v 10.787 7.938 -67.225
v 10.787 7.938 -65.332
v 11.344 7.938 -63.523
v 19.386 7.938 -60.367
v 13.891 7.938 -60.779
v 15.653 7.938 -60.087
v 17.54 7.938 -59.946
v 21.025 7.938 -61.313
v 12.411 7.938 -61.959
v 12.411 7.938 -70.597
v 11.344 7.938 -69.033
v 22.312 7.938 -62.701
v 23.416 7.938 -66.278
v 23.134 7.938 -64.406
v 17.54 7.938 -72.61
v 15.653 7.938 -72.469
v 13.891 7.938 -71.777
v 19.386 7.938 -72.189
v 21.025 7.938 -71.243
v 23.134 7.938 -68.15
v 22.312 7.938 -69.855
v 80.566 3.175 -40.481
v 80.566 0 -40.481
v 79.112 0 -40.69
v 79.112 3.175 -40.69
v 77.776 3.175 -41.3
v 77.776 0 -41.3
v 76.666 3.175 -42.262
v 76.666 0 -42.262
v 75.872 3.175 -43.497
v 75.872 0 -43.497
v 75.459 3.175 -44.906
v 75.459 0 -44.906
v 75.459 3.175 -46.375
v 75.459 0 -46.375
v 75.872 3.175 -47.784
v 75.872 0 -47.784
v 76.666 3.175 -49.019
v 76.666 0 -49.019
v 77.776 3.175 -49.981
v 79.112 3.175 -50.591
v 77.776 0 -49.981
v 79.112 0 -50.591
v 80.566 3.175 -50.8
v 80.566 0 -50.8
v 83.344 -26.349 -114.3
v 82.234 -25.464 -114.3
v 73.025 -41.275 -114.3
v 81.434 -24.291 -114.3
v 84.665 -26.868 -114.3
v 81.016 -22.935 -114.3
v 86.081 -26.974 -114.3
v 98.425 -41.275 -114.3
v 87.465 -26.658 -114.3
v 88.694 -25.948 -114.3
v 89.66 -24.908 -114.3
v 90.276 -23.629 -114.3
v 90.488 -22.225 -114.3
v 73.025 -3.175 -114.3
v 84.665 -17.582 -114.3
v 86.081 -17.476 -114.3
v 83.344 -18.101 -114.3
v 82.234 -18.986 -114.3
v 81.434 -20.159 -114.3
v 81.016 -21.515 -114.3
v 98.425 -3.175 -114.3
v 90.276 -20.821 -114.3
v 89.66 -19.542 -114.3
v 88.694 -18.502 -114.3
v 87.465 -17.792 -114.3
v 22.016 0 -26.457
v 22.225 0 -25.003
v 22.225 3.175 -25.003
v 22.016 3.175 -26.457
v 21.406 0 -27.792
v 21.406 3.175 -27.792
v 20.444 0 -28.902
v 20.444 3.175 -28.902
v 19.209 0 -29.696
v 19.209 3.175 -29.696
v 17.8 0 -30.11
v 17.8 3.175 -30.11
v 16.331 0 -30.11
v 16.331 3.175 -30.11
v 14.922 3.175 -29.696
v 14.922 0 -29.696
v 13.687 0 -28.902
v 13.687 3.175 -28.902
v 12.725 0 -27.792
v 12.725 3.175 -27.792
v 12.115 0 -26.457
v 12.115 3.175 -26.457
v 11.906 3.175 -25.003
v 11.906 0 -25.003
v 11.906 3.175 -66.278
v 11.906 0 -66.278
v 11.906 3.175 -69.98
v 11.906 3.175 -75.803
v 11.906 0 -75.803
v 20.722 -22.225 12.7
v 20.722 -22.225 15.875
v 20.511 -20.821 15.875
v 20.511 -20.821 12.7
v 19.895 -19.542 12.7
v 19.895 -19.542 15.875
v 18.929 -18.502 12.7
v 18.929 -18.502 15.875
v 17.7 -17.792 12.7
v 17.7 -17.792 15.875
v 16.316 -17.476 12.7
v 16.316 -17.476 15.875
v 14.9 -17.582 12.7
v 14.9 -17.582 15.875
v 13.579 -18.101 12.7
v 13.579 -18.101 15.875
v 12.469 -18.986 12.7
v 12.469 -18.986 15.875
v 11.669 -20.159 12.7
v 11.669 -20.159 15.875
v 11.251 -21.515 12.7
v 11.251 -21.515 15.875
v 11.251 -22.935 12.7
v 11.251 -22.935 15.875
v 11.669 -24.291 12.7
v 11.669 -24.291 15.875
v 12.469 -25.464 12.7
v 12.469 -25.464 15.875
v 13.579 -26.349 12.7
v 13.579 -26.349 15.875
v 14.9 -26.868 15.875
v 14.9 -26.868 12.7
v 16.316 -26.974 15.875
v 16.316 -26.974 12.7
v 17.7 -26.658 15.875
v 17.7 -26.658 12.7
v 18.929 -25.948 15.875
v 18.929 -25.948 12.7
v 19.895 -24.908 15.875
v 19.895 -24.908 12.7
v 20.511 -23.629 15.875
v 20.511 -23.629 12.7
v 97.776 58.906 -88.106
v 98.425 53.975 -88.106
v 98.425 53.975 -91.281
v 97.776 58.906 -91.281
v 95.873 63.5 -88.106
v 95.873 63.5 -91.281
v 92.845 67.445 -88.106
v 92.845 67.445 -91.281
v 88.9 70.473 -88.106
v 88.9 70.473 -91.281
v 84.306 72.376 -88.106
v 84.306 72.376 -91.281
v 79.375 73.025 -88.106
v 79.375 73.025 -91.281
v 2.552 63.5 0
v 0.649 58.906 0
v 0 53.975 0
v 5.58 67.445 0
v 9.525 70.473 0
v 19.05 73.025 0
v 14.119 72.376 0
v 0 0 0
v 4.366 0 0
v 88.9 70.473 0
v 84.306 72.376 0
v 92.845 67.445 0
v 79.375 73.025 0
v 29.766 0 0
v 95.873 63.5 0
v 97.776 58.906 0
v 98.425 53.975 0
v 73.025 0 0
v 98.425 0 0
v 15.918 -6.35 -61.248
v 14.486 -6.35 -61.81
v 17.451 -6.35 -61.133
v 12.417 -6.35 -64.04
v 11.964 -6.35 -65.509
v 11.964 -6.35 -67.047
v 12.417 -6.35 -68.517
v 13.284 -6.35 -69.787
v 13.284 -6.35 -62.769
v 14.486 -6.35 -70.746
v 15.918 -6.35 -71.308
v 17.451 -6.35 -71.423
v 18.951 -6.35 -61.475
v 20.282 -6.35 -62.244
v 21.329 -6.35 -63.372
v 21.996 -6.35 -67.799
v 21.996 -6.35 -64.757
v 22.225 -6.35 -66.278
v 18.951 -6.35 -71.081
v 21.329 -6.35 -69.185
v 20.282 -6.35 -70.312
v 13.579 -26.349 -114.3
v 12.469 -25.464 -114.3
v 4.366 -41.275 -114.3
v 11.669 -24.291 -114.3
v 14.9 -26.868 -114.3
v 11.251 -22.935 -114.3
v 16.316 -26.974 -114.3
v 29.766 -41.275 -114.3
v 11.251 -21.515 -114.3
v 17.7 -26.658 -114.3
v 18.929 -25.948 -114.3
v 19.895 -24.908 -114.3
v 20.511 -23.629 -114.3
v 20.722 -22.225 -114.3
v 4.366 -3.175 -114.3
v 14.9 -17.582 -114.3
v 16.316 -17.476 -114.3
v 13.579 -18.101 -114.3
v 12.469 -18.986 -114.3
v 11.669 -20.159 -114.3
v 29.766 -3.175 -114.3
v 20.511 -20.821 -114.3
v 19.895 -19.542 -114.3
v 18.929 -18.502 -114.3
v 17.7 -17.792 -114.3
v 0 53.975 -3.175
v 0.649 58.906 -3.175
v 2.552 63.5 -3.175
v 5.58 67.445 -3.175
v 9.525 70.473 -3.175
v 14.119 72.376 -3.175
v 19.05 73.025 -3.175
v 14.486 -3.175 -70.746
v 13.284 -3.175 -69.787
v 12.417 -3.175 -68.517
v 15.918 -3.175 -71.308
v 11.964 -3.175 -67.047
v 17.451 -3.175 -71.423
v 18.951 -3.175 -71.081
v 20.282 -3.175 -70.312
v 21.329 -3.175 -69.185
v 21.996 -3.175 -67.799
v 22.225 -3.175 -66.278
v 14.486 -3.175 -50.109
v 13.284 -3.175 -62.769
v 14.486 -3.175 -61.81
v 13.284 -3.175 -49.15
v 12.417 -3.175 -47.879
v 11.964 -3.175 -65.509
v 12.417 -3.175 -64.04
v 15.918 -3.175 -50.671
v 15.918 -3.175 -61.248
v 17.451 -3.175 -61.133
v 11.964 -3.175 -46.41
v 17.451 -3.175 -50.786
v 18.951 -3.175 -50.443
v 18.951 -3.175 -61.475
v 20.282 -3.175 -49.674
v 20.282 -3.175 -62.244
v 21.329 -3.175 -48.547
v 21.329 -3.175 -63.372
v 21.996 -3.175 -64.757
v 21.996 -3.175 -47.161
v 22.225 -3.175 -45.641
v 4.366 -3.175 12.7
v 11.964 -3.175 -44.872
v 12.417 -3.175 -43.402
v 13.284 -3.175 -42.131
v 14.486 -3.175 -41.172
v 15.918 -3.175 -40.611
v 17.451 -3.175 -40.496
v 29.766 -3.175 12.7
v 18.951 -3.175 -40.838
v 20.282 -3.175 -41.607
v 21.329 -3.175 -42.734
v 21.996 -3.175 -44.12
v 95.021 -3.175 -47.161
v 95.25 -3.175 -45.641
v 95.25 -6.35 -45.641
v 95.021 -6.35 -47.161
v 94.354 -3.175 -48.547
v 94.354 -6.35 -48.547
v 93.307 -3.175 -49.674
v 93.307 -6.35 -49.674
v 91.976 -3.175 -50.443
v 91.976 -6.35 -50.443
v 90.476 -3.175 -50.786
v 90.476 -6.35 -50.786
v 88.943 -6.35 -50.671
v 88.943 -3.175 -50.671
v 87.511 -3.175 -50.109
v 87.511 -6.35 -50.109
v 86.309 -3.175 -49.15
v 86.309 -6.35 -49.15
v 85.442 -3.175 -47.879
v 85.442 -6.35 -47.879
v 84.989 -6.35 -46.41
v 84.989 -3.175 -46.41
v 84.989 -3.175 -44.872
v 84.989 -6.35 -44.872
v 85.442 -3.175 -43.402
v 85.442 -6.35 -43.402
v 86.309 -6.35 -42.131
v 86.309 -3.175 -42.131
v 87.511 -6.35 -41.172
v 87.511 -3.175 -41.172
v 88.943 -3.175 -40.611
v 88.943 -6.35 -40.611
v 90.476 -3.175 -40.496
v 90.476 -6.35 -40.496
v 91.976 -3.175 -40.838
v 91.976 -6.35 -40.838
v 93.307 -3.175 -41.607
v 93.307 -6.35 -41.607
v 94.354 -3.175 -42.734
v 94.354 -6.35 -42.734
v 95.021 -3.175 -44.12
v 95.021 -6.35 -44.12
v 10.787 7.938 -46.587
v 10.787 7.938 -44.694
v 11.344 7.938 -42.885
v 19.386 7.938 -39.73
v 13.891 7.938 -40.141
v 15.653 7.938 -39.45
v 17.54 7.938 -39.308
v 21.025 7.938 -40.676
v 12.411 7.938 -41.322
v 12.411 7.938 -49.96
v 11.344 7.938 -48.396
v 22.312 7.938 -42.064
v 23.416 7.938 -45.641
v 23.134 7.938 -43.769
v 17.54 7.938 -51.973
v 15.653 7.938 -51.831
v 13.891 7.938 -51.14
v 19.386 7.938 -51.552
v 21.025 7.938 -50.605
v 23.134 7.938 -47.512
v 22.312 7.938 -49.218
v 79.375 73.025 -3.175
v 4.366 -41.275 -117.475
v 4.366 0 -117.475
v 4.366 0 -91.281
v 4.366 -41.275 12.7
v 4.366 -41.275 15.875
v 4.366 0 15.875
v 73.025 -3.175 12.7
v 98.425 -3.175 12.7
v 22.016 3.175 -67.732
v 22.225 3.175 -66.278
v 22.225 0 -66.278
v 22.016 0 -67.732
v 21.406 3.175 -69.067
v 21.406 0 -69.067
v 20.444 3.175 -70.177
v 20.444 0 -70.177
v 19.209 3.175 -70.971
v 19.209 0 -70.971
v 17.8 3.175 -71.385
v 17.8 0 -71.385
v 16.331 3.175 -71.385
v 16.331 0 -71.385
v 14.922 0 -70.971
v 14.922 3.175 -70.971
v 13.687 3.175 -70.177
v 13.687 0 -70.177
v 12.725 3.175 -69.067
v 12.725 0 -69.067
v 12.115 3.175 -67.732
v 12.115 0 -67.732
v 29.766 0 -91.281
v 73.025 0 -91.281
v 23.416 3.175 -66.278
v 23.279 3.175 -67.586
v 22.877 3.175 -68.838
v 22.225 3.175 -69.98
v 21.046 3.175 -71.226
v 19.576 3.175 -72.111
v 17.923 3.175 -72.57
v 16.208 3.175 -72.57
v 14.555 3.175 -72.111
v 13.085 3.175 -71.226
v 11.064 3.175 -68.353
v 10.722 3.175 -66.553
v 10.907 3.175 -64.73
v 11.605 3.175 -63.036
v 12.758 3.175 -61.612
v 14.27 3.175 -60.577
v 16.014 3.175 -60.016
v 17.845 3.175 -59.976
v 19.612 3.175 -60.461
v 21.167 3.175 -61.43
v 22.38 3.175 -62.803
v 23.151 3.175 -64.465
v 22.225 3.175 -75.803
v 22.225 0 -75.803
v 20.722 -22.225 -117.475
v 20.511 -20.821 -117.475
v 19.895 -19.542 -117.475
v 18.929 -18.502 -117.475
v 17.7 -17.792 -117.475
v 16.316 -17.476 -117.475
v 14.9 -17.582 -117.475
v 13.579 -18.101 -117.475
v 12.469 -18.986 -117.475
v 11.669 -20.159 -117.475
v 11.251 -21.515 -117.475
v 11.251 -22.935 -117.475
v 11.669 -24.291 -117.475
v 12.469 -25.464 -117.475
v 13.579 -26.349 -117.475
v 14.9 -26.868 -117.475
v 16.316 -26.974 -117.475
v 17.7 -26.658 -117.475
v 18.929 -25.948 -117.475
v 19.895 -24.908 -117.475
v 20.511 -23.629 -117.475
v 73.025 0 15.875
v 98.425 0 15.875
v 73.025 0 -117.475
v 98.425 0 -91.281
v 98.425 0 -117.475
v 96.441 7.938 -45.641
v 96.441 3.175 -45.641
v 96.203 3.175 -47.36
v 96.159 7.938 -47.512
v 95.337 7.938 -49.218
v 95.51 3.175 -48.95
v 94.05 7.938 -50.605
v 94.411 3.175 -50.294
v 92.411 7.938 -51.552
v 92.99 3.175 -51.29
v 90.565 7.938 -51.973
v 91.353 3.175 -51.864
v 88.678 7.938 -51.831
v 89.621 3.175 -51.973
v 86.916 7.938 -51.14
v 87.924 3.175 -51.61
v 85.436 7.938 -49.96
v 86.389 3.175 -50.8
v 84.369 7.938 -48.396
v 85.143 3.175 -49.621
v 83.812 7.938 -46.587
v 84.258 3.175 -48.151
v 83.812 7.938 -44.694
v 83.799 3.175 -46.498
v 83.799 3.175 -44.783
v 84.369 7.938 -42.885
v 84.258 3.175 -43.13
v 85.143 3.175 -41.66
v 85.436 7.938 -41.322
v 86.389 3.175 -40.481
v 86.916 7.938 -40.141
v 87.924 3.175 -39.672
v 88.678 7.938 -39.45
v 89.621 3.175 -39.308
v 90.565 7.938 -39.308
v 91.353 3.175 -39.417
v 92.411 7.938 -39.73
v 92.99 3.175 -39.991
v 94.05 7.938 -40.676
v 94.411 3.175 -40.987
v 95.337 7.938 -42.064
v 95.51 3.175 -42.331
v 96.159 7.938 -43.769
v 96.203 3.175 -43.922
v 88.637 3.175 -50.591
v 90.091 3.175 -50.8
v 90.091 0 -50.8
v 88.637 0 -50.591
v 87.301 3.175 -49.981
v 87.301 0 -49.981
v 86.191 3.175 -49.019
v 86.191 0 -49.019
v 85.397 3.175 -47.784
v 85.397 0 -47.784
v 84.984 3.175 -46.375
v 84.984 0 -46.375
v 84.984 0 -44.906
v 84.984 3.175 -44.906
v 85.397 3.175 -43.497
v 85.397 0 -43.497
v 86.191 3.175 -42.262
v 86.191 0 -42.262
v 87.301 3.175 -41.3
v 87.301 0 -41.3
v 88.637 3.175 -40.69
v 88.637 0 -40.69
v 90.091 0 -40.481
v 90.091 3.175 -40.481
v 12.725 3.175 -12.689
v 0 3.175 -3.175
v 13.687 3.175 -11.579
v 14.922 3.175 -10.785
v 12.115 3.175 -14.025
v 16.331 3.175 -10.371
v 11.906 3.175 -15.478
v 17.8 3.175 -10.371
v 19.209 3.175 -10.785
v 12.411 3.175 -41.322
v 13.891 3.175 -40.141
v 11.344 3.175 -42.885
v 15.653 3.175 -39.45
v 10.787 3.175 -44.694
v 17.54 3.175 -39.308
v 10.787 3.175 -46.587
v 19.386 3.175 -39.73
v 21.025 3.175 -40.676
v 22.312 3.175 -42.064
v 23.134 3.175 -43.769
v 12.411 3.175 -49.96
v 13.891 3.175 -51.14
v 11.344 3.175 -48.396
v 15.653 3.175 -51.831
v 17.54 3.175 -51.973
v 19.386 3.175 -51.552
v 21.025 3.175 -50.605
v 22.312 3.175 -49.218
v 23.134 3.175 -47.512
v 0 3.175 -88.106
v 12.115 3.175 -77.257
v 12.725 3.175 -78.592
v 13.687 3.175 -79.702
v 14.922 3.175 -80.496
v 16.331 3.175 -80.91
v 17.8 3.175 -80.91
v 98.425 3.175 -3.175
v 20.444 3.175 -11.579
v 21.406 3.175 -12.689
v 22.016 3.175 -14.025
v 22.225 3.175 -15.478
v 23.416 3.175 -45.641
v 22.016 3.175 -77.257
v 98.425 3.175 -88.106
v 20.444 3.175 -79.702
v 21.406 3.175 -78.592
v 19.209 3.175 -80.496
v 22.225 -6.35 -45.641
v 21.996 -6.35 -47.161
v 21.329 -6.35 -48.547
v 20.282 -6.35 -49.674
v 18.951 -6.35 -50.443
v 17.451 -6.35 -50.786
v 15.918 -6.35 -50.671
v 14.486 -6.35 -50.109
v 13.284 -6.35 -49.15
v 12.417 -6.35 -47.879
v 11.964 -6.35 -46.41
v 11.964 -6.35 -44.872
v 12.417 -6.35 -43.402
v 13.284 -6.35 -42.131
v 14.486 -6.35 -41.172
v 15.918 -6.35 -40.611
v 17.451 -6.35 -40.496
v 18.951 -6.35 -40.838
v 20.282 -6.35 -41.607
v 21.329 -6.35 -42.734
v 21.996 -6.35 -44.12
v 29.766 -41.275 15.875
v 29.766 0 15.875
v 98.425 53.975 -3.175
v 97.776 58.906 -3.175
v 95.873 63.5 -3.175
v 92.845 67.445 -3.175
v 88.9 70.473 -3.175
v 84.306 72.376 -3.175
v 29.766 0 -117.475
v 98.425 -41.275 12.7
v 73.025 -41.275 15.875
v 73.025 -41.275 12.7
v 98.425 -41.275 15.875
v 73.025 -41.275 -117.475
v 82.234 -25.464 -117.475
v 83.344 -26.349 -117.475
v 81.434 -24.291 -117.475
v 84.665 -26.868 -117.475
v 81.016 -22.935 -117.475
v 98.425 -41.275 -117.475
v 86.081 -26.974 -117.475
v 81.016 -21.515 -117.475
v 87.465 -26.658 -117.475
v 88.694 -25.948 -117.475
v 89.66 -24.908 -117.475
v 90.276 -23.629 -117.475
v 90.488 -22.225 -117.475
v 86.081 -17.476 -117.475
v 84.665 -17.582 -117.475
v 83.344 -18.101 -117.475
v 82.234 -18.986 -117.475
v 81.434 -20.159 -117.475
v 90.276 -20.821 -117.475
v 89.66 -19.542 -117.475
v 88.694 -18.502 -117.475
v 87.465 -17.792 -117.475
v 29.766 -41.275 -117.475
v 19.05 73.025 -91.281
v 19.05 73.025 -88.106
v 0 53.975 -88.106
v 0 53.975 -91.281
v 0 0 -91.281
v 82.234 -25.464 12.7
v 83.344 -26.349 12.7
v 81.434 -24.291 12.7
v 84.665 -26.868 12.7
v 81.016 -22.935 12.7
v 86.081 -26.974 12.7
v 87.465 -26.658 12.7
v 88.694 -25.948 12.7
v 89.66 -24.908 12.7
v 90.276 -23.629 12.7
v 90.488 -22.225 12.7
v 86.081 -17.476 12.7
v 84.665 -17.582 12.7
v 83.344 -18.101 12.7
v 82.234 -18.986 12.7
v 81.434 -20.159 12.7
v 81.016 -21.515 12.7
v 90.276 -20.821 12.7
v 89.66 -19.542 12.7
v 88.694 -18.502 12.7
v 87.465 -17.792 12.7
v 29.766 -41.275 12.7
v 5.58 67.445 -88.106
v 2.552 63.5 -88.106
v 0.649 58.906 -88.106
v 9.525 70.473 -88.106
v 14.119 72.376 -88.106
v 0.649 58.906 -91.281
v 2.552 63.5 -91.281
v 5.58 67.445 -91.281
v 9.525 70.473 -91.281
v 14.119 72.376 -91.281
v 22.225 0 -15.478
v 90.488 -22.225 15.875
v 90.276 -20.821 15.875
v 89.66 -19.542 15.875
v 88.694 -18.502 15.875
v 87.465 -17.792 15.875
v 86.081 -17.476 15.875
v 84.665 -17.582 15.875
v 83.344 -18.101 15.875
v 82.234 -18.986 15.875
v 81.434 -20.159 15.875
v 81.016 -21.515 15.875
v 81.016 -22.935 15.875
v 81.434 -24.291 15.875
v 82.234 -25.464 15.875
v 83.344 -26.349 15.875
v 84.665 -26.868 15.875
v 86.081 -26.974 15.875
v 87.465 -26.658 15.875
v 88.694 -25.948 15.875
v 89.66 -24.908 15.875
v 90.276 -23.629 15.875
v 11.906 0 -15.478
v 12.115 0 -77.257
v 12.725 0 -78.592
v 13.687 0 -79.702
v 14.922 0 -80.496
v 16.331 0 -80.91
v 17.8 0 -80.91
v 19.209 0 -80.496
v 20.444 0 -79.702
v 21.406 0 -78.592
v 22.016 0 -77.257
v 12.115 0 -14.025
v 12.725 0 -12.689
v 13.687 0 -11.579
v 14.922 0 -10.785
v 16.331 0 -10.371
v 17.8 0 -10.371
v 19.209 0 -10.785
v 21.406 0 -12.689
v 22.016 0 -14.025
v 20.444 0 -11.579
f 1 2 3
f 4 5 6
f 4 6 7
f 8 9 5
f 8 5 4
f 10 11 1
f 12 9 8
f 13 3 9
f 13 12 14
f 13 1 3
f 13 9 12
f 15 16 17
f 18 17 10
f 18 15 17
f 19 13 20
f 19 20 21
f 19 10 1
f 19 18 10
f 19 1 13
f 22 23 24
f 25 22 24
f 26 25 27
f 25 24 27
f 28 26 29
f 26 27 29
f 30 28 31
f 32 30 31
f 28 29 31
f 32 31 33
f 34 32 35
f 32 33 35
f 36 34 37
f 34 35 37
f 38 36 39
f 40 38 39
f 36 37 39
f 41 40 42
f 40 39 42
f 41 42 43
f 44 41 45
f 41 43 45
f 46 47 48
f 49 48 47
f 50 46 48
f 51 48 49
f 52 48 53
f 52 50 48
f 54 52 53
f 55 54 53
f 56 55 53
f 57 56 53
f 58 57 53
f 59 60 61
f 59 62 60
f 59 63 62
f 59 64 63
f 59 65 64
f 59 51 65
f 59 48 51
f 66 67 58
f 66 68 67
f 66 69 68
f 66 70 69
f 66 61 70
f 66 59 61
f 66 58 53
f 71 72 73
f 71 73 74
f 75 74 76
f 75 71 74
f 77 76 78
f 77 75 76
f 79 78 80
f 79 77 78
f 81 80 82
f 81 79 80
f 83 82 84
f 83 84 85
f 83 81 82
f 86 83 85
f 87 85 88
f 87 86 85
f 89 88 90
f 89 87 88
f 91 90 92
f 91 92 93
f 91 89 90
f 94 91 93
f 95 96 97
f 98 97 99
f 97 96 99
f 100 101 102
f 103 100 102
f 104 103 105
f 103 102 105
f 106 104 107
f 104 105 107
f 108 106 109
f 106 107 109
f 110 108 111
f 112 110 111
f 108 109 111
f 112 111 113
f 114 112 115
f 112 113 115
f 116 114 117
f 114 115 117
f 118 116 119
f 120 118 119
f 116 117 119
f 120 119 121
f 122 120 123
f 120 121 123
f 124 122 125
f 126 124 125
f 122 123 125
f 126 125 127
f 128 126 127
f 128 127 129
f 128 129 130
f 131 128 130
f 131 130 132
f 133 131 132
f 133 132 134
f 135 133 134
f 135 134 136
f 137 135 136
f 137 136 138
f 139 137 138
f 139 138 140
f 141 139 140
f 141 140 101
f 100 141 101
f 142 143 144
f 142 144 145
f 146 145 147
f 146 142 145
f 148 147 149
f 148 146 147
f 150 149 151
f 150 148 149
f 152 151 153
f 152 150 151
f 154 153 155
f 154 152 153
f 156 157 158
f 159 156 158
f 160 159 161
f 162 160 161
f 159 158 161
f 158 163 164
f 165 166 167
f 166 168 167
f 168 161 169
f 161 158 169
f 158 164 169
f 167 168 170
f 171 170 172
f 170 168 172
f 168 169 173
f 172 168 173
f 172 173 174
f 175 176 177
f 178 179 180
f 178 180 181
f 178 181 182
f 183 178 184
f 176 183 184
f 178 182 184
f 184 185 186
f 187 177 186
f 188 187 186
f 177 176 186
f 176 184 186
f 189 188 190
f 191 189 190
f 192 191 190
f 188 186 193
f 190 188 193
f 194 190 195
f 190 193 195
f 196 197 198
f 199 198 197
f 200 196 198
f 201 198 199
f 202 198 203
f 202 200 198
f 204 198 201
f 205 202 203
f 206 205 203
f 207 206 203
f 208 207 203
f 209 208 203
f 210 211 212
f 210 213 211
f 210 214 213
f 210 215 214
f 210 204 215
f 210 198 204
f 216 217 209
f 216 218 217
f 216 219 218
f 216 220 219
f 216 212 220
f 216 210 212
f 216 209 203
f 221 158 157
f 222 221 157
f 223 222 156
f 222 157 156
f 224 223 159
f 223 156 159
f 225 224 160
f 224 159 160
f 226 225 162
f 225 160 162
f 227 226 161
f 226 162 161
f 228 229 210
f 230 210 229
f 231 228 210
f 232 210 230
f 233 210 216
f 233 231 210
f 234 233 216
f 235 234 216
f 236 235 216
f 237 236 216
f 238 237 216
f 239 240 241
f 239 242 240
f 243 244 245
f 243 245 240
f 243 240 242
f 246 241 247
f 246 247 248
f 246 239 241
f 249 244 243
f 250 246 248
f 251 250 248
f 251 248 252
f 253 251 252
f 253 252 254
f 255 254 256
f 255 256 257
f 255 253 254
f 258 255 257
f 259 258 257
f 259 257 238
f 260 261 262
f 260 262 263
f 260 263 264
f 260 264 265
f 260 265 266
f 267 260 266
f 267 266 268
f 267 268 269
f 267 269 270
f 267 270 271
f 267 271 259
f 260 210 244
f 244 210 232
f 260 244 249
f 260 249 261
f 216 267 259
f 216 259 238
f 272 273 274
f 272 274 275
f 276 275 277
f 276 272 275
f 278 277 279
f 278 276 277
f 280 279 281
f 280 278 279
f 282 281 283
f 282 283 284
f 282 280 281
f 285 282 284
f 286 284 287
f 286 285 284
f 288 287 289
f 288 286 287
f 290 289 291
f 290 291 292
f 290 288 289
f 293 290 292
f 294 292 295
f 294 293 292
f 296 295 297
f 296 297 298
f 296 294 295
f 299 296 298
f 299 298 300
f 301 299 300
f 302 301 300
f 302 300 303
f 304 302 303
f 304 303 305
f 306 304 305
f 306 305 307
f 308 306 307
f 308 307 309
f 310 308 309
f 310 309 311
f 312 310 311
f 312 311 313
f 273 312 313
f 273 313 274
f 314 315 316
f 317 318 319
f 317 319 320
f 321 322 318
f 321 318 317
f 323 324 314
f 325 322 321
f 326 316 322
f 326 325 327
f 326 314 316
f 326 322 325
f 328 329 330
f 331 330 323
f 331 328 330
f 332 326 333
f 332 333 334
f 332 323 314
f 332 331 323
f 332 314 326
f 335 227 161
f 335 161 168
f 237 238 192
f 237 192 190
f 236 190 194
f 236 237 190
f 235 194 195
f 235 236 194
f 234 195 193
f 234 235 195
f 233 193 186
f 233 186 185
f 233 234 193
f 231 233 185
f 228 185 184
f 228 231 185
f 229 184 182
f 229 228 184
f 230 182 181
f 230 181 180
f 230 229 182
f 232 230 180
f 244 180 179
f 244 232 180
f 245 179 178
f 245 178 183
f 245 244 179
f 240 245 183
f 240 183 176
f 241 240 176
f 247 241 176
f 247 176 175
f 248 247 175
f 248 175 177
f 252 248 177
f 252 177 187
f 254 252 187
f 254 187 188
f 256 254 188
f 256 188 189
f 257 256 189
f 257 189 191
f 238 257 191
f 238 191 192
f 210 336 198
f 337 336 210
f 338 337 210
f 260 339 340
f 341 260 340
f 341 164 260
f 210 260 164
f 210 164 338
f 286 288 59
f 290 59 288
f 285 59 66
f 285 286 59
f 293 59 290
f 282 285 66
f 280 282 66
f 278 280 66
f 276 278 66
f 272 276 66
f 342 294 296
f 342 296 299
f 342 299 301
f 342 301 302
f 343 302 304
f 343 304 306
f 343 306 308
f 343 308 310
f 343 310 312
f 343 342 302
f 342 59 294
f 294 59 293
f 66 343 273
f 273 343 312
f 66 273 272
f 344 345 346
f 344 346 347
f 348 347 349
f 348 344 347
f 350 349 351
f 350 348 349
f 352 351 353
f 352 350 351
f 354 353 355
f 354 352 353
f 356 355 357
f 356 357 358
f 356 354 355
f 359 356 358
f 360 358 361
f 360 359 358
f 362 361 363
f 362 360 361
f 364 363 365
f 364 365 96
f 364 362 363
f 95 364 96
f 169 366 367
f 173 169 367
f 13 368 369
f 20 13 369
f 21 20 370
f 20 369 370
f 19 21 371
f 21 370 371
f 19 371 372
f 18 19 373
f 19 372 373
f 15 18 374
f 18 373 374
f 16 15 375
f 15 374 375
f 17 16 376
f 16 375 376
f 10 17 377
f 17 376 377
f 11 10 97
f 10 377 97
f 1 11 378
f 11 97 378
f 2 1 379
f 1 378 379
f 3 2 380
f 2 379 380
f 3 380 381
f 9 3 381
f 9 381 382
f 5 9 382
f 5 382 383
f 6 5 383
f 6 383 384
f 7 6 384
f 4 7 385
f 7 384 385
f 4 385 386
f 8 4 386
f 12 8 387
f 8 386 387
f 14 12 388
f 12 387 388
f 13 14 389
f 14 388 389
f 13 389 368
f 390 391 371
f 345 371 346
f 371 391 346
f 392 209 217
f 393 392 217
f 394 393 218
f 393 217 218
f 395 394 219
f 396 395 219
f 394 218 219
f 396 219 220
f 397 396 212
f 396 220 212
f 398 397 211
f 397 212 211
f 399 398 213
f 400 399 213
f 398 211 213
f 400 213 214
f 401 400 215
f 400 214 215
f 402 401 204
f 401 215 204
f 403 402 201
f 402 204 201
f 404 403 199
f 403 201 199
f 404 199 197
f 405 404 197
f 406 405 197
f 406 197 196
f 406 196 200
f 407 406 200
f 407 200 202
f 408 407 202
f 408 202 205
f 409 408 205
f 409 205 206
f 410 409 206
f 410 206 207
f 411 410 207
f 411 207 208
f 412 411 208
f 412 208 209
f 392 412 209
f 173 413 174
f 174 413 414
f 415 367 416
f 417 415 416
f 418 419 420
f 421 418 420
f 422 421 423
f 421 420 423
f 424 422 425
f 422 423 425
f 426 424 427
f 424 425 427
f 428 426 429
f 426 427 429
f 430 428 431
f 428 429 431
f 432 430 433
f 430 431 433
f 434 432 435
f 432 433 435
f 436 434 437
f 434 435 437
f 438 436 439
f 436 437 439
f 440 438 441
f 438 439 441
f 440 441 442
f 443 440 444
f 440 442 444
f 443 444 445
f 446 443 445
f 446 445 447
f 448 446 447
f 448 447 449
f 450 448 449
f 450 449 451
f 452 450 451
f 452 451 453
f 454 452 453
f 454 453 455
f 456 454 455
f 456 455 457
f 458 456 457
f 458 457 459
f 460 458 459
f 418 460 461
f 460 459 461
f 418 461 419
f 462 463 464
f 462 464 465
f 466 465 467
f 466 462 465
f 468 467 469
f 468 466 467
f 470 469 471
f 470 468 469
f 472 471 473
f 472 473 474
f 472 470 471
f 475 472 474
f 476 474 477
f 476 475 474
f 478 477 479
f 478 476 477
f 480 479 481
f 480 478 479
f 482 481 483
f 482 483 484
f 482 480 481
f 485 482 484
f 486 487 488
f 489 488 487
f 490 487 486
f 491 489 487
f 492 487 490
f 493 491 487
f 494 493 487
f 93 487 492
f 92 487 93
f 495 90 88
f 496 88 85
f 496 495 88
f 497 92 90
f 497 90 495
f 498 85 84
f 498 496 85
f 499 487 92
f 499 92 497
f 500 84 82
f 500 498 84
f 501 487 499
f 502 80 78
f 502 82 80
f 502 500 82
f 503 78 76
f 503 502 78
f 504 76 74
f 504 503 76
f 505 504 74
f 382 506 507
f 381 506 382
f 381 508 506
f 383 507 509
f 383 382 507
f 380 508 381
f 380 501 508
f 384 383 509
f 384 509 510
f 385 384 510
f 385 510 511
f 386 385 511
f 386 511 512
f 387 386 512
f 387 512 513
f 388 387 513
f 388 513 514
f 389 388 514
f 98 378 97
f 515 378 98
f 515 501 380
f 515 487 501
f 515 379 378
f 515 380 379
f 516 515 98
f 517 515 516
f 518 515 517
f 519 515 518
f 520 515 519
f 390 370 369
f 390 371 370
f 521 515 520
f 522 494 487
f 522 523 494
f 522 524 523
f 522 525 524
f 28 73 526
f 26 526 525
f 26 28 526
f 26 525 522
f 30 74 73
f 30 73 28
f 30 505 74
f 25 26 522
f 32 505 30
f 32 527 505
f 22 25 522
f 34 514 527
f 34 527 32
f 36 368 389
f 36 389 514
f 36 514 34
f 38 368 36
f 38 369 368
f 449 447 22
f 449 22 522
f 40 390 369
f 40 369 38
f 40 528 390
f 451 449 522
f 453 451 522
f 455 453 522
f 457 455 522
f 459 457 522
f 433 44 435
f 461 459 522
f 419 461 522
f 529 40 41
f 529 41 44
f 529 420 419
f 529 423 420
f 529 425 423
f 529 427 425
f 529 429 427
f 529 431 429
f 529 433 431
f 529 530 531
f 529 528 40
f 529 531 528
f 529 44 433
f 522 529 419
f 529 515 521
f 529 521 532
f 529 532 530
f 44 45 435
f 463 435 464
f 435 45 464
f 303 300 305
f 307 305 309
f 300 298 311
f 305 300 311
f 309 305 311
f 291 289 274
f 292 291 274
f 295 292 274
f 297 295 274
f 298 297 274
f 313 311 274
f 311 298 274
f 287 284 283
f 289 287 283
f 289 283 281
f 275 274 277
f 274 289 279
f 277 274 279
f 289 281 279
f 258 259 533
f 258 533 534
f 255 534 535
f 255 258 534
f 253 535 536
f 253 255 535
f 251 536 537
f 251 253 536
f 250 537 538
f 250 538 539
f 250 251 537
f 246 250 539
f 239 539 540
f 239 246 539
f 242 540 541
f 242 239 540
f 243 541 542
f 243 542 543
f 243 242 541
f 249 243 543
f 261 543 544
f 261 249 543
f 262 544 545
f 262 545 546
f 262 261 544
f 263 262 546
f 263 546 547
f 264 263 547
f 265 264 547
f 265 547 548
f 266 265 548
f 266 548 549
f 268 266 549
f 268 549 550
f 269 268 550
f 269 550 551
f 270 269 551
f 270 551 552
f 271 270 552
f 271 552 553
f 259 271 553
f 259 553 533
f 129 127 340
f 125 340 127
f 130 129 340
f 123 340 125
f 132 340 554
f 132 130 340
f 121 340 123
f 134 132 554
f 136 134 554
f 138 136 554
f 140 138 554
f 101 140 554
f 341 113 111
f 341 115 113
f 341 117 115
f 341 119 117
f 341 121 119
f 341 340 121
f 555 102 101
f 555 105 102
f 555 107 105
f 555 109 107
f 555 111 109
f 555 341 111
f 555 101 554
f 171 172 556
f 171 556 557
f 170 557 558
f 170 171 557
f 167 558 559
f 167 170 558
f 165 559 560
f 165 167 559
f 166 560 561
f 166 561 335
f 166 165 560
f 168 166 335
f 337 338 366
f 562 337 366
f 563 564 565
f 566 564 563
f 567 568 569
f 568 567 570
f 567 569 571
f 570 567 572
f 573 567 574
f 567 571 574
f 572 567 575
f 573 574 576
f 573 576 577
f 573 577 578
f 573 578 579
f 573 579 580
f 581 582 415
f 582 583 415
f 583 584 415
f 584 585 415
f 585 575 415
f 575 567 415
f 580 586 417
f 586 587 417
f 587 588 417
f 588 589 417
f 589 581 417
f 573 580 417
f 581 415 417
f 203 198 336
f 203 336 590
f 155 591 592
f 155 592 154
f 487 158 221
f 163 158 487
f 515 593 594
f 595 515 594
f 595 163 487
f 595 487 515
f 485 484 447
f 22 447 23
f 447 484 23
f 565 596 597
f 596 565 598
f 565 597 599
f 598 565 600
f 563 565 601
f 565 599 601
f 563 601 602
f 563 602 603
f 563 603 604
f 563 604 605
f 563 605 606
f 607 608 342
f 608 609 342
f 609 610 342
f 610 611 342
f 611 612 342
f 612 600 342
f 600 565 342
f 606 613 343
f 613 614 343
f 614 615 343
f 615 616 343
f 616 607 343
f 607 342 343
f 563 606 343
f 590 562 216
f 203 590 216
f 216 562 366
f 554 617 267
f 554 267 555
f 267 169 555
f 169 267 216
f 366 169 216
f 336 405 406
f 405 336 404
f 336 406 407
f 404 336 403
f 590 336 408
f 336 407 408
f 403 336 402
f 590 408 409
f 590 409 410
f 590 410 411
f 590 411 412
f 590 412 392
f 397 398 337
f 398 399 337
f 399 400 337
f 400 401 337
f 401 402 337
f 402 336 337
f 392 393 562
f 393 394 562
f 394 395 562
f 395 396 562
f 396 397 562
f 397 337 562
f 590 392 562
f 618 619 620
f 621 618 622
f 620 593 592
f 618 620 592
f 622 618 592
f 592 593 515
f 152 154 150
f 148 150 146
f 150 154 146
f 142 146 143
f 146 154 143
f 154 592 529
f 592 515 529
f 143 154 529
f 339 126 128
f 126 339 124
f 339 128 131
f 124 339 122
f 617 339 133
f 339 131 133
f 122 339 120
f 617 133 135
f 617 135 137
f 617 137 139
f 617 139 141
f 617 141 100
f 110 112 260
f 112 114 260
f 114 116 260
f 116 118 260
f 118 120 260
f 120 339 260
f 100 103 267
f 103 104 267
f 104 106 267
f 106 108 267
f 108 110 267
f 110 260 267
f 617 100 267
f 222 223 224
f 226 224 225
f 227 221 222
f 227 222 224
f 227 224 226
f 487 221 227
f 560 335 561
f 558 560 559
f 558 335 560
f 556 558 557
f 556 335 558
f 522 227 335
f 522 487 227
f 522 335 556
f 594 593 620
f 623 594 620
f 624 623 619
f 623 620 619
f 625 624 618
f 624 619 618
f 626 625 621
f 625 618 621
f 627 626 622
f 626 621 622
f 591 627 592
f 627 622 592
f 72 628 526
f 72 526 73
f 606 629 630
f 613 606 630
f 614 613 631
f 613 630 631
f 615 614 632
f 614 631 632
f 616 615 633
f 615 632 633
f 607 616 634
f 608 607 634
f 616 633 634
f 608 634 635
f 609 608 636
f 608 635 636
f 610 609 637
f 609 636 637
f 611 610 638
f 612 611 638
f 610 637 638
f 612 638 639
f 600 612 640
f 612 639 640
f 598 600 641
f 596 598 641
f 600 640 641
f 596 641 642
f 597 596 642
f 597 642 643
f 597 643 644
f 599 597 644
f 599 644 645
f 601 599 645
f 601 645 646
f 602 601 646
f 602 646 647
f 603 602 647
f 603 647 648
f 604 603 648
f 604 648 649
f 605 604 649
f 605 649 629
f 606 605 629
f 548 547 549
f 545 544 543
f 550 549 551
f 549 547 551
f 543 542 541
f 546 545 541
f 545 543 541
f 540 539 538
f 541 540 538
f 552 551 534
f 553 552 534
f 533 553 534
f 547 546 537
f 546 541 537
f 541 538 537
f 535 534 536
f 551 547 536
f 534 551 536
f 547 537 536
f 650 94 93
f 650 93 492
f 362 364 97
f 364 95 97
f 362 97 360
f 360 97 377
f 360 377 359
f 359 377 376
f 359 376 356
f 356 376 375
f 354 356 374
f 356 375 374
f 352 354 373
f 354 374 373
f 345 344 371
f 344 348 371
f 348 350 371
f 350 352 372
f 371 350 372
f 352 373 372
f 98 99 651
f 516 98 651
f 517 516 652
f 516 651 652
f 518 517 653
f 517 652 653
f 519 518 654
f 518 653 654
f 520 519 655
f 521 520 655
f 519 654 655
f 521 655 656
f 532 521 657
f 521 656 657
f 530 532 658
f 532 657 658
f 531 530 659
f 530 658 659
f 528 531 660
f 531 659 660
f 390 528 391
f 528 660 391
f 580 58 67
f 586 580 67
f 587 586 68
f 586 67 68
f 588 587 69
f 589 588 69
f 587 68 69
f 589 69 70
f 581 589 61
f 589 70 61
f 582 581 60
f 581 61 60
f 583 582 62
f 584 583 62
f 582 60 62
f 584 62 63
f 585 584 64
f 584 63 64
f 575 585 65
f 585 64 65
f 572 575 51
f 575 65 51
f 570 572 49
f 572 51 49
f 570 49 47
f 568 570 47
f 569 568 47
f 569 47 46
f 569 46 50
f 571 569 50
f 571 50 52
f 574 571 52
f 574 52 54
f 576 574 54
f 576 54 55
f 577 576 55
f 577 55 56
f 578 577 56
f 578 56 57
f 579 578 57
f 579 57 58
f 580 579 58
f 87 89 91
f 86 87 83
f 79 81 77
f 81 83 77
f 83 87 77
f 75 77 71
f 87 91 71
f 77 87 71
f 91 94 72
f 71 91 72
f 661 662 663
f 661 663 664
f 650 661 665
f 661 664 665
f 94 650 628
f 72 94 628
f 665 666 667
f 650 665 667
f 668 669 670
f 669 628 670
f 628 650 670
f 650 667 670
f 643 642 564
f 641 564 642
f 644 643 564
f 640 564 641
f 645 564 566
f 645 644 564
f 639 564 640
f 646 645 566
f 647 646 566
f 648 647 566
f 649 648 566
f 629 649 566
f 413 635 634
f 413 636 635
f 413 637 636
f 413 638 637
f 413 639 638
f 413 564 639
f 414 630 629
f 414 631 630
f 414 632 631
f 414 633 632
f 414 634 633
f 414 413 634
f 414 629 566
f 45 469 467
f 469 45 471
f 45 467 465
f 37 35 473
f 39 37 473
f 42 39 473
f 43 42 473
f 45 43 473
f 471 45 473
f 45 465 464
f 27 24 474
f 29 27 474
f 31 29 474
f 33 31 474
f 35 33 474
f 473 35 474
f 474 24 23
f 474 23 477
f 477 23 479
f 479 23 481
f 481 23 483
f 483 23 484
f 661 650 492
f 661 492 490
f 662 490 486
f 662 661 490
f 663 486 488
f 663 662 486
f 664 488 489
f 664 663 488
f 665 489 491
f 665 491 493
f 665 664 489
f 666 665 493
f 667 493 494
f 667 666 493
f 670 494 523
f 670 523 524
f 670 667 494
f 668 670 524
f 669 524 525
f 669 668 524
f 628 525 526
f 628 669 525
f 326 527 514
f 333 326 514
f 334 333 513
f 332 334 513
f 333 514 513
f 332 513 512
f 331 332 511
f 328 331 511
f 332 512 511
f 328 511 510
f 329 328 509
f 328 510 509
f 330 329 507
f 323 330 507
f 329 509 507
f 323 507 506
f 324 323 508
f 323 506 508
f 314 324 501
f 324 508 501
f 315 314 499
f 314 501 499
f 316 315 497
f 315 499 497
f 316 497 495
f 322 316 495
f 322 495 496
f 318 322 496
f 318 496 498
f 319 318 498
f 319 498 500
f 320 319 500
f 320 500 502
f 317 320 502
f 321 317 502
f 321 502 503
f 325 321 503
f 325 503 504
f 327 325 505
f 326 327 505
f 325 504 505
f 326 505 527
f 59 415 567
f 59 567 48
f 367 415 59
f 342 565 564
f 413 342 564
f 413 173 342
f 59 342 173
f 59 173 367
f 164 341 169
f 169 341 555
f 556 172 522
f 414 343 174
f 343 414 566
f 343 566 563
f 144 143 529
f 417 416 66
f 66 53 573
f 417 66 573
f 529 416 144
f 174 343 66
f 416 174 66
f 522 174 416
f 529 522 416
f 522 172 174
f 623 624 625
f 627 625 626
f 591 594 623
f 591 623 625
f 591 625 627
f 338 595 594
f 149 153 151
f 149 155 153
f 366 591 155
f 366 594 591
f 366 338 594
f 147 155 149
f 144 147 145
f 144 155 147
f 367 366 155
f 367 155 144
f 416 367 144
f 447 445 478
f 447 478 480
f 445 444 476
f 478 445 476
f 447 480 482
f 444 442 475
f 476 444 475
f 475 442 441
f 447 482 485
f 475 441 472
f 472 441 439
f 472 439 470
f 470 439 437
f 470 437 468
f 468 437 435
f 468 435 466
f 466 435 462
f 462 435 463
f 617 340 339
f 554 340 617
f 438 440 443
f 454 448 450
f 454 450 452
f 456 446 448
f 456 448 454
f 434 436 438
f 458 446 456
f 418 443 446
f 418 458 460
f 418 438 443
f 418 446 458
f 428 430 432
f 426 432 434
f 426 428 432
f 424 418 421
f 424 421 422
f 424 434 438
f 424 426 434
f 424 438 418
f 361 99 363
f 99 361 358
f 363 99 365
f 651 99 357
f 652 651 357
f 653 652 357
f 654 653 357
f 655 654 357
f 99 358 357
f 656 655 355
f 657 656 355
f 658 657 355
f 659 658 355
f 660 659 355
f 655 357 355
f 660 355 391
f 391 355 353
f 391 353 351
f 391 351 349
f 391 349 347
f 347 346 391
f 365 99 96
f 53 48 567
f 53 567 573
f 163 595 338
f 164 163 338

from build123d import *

# Parameters (mm, degrees)
SKETCH1_W               = 98.425
SKETCH1_H               = 91.28125
SKETCH1_R               = 5.159375
BOSS_EXTRUDE1_DEPTH     = 3.175
SKETCH2_W               = 25.4
SKETCH2_H               = 133.35
BOSS_EXTRUDE3_DEPTH     = 3.175
SKETCH3_W               = 25.4
SKETCH3_H               = 3.175
BOSS_EXTRUDE4_DEPTH     = 38.1
SKETCH4_R               = 4.7625
CUT_EXTRUDE1_DEPTH      = 134.35
SKETCH5_R               = 5.159375
BOSS_EXTRUDE5_DEPTH     = 9.525
SKETCH6_R               = 6.35
BOSS_EXTRUDE6_DEPTH     = 4.7625
SKETCH7_W               = 98.425
SKETCH7_H               = 3.175
BOSS_EXTRUDE7_DEPTH     = 69.85
CUT_EXTRUDE2_DEPTH      = 16.875
CUT_EXTRUDE2_DEPTH_BACK = 118.475


with BuildPart() as part:
    # Sketch1 → Boss-Extrude1 (new body)
    with BuildSketch(Plane(origin=(0, 0, 0), x_dir=(1, 0, 0), z_dir=(0, 1, 0))):
        with Locations((49.2125, 45.640625)):
            Rectangle(SKETCH1_W, SKETCH1_H)
        with Locations((17.065625, 45.640625)):
            Circle(SKETCH1_R, mode=Mode.SUBTRACT)
        with BuildLine():
            Line((11.90625, 66.278125), (11.90625, 75.803125))
            ThreePointArc((11.90625, 75.803125), (17.065625, 80.9625), (22.225, 75.803125))
            Line((22.225, 75.803125), (22.225, 66.278125))
            ThreePointArc((22.225, 66.278125), (17.065625, 61.11875), (11.90625, 66.278125))
        make_face(mode=Mode.SUBTRACT)
        with BuildLine():
            Line((11.90625, 25.003125), (11.90625, 15.478125))
            ThreePointArc((11.90625, 15.478125), (17.065625, 10.31875), (22.225, 15.478125))
            Line((22.225, 15.478125), (22.225, 25.003125))
            ThreePointArc((22.225, 25.003125), (17.065625, 30.1625), (11.90625, 25.003125))
        make_face(mode=Mode.SUBTRACT)
        with BuildLine():
            Line((80.565625, 50.8), (90.090625, 50.8))
            ThreePointArc((90.090625, 50.8), (95.25, 45.640625), (90.090625, 40.48125))
            Line((90.090625, 40.48125), (80.565625, 40.48125))
            ThreePointArc((80.565625, 40.48125), (75.40625, 45.640625), (80.565625, 50.8))
        make_face(mode=Mode.SUBTRACT)
    extrude(amount=BOSS_EXTRUDE1_DEPTH)

    # Sketch2 → Boss-Extrude3 (add)
    with BuildSketch(Plane.XZ):
        with Locations((17.065625, -50.8)):
            Rectangle(SKETCH2_W, SKETCH2_H)
        with Locations((85.725, -50.8)):
            Rectangle(SKETCH2_W, SKETCH2_H)
    extrude(amount=BOSS_EXTRUDE3_DEPTH)

    # Sketch3 → Boss-Extrude4 (add)
    with BuildSketch(Plane.XZ.offset(3.175)):
        with Locations((17.065625, 14.2875)):
            Rectangle(SKETCH3_W, SKETCH3_H)
        with Locations((17.065625, -115.8875)):
            Rectangle(SKETCH3_W, SKETCH3_H)
        with Locations((85.725, 14.2875)):
            Rectangle(SKETCH3_W, SKETCH3_H)
        with Locations((85.725, -115.8875)):
            Rectangle(SKETCH3_W, SKETCH3_H)
    extrude(amount=BOSS_EXTRUDE4_DEPTH)

    # Sketch4 → Cut-Extrude1 (cut, through all)
    with BuildSketch(Plane.XY.offset(15.875)):
        with Locations((15.95994836, -22.225)):
            Circle(SKETCH4_R)
        with Locations((85.725, -22.225)):
            Circle(SKETCH4_R)
    extrude(amount=-CUT_EXTRUDE1_DEPTH, mode=Mode.SUBTRACT)

    # Sketch5 → Boss-Extrude5 (add)
    with BuildSketch(Plane(origin=(0, 3.175, 0), x_dir=(1, 0, 0), z_dir=(0, 1, 0))):
        with Locations((17.065625, 45.640625)):
            Circle(SKETCH5_R)
        with Locations((17.065625, 66.278125)):
            Circle(SKETCH5_R)
        with Locations((90.090625, 45.640625)):
            Circle(SKETCH5_R)
    extrude(amount=-BOSS_EXTRUDE5_DEPTH)

    # Sketch6 → Boss-Extrude6 (add)
    with BuildSketch(Plane(origin=(0, 3.175, 0), x_dir=(1, 0, 0), z_dir=(0, 1, 0))):
        with Locations((90.090625, 45.640625)):
            Circle(SKETCH6_R)
        with Locations((17.065625, 45.640625)):
            Circle(SKETCH6_R)
        with Locations((17.065625, 66.278125)):
            Circle(SKETCH6_R)
    extrude(amount=BOSS_EXTRUDE6_DEPTH)

    # Sketch7 → Boss-Extrude7 (add)
    with BuildSketch(Plane(origin=(0, 3.175, 0), x_dir=(1, 0, 0), z_dir=(0, 1, 0))):
        with Locations((49.2125, 89.69375)):
            Rectangle(SKETCH7_W, SKETCH7_H)
        with Locations((49.2125, 1.5875)):
            Rectangle(SKETCH7_W, SKETCH7_H)
    extrude(amount=BOSS_EXTRUDE7_DEPTH)

    # Sketch8 → Cut-Extrude2 (cut, two sides)
    with BuildSketch(Plane.XY) as cut_extrude2_sk:
        with BuildLine():
            Line((79.375, 73.025), (98.425, 73.025))
            Line((98.425, 73.025), (98.425, 53.975))
            ThreePointArc((98.425, 53.975), (92.845384182, 67.445384182), (79.375, 73.025))
        make_face()
        with BuildLine():
            Line((19.05, 73.025), (0, 73.025))
            Line((0, 73.025), (0, 53.975))
            ThreePointArc((0, 53.975), (5.579615818, 67.445384182), (19.05, 73.025))
        make_face()
    extrude(amount=CUT_EXTRUDE2_DEPTH, mode=Mode.SUBTRACT)
    extrude(cut_extrude2_sk.sketch, amount=-CUT_EXTRUDE2_DEPTH_BACK, mode=Mode.SUBTRACT)


solid = part.part
